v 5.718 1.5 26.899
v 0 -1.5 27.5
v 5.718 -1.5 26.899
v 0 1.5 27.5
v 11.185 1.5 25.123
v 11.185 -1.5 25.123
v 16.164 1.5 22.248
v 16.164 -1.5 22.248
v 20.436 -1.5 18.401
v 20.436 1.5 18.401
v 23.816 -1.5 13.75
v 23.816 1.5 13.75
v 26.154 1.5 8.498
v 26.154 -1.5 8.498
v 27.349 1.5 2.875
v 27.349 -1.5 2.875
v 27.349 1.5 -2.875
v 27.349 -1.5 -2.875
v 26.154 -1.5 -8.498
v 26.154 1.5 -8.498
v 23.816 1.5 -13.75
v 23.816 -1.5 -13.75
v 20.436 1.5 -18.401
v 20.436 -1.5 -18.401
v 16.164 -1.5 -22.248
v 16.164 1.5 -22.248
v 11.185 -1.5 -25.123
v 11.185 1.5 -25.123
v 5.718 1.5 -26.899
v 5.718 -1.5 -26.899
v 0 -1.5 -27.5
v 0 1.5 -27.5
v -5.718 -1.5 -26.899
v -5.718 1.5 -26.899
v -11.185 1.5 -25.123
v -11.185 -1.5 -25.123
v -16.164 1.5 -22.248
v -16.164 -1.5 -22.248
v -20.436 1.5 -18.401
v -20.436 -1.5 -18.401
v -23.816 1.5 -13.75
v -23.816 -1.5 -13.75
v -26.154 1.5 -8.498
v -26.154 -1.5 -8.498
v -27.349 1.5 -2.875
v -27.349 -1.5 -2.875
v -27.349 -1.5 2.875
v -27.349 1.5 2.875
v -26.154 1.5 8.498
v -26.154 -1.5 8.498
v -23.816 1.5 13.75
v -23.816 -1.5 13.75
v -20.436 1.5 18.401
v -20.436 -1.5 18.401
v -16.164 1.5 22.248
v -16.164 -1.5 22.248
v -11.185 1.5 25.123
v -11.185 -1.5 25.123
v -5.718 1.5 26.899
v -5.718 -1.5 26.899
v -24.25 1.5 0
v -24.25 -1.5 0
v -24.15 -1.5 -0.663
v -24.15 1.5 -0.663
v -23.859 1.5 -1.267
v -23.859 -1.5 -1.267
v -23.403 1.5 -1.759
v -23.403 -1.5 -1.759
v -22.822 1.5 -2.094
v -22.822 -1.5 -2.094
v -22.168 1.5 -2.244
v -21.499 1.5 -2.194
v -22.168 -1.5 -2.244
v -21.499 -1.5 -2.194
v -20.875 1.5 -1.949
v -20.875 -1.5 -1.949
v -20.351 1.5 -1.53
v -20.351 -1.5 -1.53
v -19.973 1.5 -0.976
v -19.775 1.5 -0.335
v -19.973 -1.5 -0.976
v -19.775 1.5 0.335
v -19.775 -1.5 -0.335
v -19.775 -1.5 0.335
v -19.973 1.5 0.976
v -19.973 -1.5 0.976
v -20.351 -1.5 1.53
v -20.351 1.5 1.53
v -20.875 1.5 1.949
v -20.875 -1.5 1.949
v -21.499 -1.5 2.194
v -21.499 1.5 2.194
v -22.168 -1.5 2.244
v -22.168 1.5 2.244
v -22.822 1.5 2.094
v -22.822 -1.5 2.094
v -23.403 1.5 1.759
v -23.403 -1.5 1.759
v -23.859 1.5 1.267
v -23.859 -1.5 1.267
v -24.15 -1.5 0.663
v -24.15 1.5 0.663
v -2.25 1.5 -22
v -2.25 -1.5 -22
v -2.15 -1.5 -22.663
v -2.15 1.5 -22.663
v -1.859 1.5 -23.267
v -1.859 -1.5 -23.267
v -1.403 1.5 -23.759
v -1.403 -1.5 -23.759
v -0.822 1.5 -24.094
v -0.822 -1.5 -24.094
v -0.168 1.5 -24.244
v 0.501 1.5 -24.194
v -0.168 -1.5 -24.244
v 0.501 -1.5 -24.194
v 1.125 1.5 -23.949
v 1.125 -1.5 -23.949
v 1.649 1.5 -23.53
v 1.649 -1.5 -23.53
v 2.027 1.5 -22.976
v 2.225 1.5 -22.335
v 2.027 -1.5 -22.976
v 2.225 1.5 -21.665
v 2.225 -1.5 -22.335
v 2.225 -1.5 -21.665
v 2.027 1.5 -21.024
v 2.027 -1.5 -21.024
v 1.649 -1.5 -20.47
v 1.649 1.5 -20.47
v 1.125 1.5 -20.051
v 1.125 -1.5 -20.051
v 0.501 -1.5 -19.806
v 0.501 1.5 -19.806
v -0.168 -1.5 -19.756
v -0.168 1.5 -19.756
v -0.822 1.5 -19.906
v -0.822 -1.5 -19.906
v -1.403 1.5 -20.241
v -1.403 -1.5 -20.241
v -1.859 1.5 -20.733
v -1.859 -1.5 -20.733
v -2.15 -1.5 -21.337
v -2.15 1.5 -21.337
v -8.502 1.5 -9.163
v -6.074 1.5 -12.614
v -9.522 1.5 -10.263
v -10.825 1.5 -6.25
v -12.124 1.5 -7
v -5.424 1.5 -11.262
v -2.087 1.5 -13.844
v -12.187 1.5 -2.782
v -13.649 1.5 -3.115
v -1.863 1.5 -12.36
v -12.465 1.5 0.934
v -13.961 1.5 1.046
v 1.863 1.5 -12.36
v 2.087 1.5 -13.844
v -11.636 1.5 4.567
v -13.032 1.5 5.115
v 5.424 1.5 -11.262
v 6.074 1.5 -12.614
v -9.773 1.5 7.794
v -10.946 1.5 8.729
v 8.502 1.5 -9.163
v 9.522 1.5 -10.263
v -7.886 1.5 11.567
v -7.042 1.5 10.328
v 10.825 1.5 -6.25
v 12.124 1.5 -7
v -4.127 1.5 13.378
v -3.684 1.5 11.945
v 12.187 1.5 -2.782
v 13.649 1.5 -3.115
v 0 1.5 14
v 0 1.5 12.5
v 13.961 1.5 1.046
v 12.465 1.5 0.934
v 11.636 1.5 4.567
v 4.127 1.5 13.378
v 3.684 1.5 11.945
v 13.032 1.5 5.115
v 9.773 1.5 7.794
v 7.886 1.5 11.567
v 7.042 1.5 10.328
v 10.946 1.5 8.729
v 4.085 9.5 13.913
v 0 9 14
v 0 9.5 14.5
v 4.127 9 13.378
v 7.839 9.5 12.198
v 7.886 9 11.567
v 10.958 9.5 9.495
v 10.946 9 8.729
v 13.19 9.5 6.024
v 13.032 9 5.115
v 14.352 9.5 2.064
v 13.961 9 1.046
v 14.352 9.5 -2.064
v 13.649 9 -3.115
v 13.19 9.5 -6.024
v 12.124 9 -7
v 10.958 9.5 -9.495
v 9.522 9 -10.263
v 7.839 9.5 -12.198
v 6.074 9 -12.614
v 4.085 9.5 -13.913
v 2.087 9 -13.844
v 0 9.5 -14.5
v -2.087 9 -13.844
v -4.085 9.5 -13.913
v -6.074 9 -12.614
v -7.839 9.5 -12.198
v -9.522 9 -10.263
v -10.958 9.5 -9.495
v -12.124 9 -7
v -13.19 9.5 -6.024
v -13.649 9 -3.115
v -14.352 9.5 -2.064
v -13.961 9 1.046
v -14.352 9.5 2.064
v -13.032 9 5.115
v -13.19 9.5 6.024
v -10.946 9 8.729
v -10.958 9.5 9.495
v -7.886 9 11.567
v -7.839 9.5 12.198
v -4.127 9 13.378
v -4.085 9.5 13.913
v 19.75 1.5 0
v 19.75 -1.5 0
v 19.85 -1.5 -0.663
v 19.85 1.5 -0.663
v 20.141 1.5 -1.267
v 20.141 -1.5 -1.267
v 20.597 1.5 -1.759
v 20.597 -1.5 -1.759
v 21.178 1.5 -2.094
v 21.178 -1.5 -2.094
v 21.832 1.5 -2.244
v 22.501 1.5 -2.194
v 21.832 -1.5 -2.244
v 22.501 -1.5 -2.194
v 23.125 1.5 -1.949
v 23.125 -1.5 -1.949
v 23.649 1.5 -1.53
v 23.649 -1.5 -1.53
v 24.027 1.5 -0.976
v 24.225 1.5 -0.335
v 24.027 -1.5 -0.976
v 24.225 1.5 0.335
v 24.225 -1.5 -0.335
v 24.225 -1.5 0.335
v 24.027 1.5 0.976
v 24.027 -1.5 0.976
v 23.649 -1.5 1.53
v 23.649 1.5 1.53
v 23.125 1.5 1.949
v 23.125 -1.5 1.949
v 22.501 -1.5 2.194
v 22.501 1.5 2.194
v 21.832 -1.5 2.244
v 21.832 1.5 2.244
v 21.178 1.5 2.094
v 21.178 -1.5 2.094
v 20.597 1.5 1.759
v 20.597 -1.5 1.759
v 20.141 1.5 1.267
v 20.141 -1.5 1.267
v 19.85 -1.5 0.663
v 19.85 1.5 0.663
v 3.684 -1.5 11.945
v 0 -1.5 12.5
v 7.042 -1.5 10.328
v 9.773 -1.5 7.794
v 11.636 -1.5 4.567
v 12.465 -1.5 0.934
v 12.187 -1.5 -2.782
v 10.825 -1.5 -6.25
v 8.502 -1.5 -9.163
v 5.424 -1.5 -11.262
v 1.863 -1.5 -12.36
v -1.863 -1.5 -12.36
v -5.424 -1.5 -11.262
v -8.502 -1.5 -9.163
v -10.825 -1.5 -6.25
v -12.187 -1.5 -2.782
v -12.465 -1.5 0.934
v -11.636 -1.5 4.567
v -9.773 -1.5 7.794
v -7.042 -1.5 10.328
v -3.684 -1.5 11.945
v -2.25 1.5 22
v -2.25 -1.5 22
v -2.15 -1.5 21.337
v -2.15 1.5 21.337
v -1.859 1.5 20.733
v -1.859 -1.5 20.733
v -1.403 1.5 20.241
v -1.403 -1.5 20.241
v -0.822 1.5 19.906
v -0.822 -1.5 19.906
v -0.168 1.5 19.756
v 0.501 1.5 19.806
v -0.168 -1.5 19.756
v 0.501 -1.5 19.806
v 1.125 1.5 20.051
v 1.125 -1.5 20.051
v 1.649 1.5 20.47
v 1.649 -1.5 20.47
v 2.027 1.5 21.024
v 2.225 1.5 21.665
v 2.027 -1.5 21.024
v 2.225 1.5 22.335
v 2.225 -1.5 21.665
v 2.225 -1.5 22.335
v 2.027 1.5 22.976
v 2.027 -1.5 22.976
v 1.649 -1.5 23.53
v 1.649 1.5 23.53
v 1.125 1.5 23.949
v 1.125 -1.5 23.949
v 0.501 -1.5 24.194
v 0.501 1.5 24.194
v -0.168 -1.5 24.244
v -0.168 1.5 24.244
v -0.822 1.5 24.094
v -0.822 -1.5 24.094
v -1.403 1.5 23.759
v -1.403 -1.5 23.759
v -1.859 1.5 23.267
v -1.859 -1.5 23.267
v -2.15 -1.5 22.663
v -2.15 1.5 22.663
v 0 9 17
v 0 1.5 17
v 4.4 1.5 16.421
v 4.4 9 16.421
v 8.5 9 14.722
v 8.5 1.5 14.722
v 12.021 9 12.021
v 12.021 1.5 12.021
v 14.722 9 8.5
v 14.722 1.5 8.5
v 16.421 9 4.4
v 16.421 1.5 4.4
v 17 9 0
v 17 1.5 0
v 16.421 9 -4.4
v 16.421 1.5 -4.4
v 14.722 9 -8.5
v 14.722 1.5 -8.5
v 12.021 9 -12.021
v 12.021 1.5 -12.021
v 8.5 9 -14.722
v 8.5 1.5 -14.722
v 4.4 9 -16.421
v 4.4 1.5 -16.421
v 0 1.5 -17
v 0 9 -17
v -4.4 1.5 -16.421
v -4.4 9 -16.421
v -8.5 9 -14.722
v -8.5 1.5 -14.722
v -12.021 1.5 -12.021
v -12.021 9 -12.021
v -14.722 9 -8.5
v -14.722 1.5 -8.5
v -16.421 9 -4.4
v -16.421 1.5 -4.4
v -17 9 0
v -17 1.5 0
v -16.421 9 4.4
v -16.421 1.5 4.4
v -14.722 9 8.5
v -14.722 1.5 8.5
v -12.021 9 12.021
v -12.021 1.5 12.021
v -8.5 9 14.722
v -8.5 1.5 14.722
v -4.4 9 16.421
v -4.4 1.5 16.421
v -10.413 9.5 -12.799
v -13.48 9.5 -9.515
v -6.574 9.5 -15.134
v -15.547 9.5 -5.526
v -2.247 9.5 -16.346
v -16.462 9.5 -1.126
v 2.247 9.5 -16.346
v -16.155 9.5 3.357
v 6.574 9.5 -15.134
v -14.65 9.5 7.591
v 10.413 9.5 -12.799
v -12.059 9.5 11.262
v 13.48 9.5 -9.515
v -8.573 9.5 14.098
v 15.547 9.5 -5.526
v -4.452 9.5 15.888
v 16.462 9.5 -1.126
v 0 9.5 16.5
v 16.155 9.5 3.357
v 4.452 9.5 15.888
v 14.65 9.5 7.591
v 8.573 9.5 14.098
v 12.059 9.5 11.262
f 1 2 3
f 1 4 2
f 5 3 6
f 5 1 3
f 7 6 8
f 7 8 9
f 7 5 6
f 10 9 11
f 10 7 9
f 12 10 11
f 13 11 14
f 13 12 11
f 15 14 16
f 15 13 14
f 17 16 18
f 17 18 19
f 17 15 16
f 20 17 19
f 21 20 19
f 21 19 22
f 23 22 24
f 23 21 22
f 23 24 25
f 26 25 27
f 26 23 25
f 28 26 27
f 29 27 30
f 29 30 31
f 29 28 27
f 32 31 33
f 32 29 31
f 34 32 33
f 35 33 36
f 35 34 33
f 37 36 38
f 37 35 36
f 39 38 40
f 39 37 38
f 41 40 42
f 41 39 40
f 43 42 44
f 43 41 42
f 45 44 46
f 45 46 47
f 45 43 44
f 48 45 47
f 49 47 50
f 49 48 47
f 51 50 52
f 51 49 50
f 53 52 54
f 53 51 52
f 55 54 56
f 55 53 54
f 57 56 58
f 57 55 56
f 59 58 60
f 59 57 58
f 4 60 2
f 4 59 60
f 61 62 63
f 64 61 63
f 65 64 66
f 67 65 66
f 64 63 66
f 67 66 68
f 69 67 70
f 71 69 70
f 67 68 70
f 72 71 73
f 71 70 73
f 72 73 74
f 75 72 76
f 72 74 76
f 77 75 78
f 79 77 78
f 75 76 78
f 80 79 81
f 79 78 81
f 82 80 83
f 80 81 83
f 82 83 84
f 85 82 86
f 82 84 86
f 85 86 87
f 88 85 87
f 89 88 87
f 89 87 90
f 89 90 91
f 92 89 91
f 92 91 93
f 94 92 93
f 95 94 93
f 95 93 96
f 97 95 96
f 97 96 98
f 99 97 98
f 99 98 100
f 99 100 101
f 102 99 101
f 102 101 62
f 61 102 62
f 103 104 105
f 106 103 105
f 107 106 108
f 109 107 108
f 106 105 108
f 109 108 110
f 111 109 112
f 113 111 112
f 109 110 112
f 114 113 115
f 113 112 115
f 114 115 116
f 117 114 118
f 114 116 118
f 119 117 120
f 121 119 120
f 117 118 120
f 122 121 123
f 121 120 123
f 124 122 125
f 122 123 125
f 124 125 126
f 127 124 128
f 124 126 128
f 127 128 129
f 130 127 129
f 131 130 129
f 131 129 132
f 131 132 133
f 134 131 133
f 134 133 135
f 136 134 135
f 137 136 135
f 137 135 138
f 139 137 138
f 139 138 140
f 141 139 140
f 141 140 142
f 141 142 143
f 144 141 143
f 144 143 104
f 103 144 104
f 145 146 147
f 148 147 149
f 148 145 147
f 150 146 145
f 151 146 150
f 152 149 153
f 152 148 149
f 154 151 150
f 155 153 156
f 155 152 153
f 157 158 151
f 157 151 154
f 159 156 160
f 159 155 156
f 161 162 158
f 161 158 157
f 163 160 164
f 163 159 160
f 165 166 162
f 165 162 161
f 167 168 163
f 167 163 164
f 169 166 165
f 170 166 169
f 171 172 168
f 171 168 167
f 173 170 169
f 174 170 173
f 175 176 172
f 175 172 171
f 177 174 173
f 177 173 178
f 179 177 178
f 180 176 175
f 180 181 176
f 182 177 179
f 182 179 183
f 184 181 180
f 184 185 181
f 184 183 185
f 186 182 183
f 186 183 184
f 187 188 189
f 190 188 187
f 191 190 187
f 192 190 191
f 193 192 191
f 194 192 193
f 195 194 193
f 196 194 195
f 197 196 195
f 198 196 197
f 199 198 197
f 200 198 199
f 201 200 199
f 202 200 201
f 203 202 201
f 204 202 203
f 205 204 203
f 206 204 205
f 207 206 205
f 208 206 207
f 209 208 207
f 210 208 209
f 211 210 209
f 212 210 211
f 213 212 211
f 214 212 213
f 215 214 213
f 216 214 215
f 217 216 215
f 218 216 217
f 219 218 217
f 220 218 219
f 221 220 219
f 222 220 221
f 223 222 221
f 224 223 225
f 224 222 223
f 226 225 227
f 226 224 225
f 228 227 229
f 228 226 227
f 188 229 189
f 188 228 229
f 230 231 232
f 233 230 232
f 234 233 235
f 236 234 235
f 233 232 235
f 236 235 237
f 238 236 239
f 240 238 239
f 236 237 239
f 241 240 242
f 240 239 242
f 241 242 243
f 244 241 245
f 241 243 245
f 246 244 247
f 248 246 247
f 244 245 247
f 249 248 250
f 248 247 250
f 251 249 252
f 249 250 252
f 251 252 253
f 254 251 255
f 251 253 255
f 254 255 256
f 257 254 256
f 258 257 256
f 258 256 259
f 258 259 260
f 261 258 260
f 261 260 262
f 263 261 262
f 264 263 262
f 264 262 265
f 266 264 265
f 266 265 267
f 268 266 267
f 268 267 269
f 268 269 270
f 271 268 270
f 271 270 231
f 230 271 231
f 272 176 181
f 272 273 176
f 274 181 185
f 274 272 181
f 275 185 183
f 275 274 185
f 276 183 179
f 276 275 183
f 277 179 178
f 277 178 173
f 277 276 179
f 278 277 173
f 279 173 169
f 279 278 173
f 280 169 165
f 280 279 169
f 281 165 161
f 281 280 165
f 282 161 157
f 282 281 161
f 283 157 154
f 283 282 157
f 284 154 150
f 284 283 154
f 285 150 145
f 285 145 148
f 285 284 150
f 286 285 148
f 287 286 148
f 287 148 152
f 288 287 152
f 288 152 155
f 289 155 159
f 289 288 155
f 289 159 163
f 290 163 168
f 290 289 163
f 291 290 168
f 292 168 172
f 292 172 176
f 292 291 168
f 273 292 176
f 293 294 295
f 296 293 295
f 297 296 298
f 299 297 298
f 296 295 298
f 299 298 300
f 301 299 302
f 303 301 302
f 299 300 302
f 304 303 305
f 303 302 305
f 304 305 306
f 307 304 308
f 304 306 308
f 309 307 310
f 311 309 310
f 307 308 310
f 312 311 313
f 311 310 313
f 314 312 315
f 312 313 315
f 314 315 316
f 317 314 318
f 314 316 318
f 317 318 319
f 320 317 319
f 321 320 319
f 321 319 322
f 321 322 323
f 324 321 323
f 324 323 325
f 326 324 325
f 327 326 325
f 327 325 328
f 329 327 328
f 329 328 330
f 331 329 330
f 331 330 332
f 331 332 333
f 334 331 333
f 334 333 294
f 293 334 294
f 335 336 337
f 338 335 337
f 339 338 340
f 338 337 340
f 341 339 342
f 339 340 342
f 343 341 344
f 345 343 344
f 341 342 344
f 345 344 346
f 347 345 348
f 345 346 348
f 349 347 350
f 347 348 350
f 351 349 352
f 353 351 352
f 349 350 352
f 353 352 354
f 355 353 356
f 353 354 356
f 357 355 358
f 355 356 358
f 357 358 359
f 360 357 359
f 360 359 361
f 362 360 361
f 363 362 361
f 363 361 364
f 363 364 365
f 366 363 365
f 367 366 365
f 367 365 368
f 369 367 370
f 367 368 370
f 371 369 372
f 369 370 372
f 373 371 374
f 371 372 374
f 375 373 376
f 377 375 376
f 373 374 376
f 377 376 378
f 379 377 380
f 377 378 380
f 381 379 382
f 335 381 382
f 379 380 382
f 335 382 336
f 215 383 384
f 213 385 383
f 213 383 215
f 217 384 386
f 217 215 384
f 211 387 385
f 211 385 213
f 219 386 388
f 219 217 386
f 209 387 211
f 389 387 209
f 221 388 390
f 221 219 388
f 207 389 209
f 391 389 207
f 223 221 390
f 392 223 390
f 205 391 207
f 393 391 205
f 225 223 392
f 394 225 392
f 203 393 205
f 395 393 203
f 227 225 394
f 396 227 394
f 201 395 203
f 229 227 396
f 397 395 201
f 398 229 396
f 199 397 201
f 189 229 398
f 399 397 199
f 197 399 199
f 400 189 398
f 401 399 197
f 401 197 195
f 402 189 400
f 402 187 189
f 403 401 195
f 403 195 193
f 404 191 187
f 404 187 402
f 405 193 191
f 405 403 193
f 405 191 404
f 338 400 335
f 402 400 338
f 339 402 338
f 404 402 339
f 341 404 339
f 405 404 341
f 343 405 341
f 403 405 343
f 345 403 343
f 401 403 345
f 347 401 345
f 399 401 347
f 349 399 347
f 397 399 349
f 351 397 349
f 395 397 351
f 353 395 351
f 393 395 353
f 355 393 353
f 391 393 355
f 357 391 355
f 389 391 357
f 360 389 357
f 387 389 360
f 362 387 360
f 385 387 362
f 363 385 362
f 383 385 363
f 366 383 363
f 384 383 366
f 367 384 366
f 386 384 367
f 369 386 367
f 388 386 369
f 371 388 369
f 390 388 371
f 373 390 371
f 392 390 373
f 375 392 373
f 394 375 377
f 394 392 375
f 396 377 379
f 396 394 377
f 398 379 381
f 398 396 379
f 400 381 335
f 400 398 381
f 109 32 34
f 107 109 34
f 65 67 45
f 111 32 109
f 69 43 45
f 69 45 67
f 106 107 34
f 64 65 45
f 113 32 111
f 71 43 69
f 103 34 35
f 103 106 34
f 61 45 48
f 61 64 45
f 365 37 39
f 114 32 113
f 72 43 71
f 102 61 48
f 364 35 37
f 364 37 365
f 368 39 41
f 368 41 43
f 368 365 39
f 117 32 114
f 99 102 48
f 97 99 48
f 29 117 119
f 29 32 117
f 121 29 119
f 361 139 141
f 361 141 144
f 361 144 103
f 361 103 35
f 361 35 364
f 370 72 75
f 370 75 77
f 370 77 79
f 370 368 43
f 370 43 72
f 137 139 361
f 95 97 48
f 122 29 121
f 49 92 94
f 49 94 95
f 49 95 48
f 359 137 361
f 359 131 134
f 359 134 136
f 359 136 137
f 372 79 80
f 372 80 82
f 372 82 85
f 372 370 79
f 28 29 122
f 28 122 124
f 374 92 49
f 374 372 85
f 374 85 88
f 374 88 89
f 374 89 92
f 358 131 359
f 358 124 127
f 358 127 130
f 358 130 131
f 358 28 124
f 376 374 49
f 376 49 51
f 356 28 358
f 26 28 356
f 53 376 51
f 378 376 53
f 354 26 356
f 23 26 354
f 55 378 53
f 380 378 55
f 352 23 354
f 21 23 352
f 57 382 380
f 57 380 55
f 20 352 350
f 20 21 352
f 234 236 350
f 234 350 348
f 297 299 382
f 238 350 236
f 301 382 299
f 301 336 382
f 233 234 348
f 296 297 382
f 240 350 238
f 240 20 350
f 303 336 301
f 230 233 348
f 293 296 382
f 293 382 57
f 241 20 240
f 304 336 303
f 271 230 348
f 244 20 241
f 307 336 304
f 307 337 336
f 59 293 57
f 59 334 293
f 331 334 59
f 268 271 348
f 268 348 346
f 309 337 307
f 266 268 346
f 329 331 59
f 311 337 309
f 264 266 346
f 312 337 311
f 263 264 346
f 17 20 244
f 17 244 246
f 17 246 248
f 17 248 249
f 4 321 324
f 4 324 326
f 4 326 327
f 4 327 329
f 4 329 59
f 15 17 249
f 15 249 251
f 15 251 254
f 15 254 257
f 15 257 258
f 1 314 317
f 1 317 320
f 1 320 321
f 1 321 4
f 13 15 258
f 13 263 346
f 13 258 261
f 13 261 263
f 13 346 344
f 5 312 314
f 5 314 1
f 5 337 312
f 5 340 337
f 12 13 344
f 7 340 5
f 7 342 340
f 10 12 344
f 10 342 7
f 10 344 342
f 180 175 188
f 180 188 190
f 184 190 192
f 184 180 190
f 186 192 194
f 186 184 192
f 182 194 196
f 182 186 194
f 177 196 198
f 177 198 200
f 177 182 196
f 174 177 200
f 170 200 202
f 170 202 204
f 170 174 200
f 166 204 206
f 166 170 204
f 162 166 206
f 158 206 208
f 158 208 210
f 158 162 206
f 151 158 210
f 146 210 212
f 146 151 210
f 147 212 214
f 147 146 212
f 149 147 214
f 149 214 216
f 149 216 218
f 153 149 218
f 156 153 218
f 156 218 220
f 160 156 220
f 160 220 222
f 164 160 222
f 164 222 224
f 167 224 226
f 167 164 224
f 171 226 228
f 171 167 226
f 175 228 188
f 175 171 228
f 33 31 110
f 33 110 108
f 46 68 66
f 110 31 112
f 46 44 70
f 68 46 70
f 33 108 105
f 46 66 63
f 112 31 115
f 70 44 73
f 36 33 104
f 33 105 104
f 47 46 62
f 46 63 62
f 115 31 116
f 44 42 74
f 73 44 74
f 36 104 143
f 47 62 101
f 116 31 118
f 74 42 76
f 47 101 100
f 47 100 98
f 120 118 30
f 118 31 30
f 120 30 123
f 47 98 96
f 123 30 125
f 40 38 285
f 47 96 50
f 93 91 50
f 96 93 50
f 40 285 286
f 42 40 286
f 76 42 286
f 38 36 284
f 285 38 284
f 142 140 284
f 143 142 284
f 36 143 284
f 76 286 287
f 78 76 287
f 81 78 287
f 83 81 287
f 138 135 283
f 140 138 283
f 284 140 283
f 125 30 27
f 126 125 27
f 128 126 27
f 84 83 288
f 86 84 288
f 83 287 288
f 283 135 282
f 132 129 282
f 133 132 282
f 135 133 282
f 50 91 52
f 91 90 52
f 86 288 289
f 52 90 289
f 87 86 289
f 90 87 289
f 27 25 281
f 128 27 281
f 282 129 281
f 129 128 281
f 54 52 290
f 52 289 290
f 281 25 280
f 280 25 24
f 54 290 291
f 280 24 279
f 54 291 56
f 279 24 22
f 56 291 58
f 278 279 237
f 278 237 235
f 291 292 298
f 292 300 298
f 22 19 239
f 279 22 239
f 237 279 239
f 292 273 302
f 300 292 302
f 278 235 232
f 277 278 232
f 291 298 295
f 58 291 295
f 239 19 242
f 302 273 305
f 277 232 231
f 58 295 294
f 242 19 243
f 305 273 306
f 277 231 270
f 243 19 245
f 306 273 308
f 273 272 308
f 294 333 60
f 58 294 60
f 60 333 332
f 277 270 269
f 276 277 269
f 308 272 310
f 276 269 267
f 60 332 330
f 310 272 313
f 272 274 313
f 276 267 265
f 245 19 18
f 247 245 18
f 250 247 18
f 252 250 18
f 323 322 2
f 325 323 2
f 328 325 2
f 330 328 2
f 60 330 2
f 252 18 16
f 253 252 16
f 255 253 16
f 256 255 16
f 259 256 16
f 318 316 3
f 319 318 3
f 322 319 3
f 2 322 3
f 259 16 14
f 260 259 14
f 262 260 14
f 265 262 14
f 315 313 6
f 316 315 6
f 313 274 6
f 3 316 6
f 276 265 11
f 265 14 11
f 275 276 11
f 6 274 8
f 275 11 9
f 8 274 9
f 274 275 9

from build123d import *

# Parameters (mm, degrees)
SKETCH1_R                = 27.5
SKETCH1_R_2              = 12.5
SKETCH1_R_3              = 1
BOSS_EXTRUDE1_DEPTH      = 1.5
SKETCH2_R                = 17
SKETCH2_R_2              = 14
BOSS_EXTRUDE2_DEPTH      = 8
CHAMFER1_SIZE            = 0.5
M4_CLEARANCE_HOLE1_D     = 4.5
M4_CLEARANCE_HOLE1_DEPTH = 11.5
M4_CLEARANCE_HOLE1_TIP   = 1.351936393


with BuildPart() as part:
    # Sketch1 → Boss-Extrude1 (new, symmetric)
    with BuildSketch(Plane(origin=(0, 0, 0), x_dir=(1, 0, 0), z_dir=(0, 1, 0))):
        with Locations(Location((0, 0, 0), (0, 0, 270))):
            Circle(SKETCH1_R)
        with Locations(Location((0, 0, 0), (0, 0, 270))):
            Circle(SKETCH1_R_2, mode=Mode.SUBTRACT)
        with Locations(Location((0, 22, 0), (0, 0, 270))):
            Circle(SKETCH1_R_3, mode=Mode.SUBTRACT)
        with Locations(Location((22, 0, 0), (0, 0, 270))):
            Circle(SKETCH1_R_3, mode=Mode.SUBTRACT)
        with Locations(Location((0, -22, 0), (0, 0, 270))):
            Circle(SKETCH1_R_3, mode=Mode.SUBTRACT)
        with Locations(Location((-22, 0, 0), (0, 0, 270))):
            Circle(SKETCH1_R_3, mode=Mode.SUBTRACT)
    extrude(amount=BOSS_EXTRUDE1_DEPTH, both=True)

    # Sketch2 → Boss-Extrude2 (add)
    with BuildSketch(Plane(origin=(0, 1.5, 0), x_dir=(1, 0, 0), z_dir=(0, 1, 0))):
        with Locations(Location((0, 0, 0), (0, 0, 270))):
            Circle(SKETCH2_R)
        with Locations(Location((0, 0, 0), (0, 0, 270))):
            Circle(SKETCH2_R_2, mode=Mode.SUBTRACT)
    extrude(amount=BOSS_EXTRUDE2_DEPTH)

    # Chamfer1
    chamfer1_edges = [part.edges().sort_by_distance(p)[0] for p in [
        (0, 9.5, -17),
        (0, 9.5, -14),
    ]]
    chamfer(chamfer1_edges, length=CHAMFER1_SIZE)

    # M4 Clearance Hole1
    with Locations(Plane(origin=(0, 1.5, 0), x_dir=(1, 0, 0), z_dir=(0, 1, 0))):
        with Locations((0, 22), (22, 0), (-22, 0), (0, -22)):
            Hole(M4_CLEARANCE_HOLE1_D / 2, depth=M4_CLEARANCE_HOLE1_DEPTH)
            with Locations((0, 0, -(M4_CLEARANCE_HOLE1_DEPTH + M4_CLEARANCE_HOLE1_TIP / 2))):  # 118° drill point
                Cone(0, M4_CLEARANCE_HOLE1_D / 2, M4_CLEARANCE_HOLE1_TIP, mode=Mode.SUBTRACT)


solid = part.part
